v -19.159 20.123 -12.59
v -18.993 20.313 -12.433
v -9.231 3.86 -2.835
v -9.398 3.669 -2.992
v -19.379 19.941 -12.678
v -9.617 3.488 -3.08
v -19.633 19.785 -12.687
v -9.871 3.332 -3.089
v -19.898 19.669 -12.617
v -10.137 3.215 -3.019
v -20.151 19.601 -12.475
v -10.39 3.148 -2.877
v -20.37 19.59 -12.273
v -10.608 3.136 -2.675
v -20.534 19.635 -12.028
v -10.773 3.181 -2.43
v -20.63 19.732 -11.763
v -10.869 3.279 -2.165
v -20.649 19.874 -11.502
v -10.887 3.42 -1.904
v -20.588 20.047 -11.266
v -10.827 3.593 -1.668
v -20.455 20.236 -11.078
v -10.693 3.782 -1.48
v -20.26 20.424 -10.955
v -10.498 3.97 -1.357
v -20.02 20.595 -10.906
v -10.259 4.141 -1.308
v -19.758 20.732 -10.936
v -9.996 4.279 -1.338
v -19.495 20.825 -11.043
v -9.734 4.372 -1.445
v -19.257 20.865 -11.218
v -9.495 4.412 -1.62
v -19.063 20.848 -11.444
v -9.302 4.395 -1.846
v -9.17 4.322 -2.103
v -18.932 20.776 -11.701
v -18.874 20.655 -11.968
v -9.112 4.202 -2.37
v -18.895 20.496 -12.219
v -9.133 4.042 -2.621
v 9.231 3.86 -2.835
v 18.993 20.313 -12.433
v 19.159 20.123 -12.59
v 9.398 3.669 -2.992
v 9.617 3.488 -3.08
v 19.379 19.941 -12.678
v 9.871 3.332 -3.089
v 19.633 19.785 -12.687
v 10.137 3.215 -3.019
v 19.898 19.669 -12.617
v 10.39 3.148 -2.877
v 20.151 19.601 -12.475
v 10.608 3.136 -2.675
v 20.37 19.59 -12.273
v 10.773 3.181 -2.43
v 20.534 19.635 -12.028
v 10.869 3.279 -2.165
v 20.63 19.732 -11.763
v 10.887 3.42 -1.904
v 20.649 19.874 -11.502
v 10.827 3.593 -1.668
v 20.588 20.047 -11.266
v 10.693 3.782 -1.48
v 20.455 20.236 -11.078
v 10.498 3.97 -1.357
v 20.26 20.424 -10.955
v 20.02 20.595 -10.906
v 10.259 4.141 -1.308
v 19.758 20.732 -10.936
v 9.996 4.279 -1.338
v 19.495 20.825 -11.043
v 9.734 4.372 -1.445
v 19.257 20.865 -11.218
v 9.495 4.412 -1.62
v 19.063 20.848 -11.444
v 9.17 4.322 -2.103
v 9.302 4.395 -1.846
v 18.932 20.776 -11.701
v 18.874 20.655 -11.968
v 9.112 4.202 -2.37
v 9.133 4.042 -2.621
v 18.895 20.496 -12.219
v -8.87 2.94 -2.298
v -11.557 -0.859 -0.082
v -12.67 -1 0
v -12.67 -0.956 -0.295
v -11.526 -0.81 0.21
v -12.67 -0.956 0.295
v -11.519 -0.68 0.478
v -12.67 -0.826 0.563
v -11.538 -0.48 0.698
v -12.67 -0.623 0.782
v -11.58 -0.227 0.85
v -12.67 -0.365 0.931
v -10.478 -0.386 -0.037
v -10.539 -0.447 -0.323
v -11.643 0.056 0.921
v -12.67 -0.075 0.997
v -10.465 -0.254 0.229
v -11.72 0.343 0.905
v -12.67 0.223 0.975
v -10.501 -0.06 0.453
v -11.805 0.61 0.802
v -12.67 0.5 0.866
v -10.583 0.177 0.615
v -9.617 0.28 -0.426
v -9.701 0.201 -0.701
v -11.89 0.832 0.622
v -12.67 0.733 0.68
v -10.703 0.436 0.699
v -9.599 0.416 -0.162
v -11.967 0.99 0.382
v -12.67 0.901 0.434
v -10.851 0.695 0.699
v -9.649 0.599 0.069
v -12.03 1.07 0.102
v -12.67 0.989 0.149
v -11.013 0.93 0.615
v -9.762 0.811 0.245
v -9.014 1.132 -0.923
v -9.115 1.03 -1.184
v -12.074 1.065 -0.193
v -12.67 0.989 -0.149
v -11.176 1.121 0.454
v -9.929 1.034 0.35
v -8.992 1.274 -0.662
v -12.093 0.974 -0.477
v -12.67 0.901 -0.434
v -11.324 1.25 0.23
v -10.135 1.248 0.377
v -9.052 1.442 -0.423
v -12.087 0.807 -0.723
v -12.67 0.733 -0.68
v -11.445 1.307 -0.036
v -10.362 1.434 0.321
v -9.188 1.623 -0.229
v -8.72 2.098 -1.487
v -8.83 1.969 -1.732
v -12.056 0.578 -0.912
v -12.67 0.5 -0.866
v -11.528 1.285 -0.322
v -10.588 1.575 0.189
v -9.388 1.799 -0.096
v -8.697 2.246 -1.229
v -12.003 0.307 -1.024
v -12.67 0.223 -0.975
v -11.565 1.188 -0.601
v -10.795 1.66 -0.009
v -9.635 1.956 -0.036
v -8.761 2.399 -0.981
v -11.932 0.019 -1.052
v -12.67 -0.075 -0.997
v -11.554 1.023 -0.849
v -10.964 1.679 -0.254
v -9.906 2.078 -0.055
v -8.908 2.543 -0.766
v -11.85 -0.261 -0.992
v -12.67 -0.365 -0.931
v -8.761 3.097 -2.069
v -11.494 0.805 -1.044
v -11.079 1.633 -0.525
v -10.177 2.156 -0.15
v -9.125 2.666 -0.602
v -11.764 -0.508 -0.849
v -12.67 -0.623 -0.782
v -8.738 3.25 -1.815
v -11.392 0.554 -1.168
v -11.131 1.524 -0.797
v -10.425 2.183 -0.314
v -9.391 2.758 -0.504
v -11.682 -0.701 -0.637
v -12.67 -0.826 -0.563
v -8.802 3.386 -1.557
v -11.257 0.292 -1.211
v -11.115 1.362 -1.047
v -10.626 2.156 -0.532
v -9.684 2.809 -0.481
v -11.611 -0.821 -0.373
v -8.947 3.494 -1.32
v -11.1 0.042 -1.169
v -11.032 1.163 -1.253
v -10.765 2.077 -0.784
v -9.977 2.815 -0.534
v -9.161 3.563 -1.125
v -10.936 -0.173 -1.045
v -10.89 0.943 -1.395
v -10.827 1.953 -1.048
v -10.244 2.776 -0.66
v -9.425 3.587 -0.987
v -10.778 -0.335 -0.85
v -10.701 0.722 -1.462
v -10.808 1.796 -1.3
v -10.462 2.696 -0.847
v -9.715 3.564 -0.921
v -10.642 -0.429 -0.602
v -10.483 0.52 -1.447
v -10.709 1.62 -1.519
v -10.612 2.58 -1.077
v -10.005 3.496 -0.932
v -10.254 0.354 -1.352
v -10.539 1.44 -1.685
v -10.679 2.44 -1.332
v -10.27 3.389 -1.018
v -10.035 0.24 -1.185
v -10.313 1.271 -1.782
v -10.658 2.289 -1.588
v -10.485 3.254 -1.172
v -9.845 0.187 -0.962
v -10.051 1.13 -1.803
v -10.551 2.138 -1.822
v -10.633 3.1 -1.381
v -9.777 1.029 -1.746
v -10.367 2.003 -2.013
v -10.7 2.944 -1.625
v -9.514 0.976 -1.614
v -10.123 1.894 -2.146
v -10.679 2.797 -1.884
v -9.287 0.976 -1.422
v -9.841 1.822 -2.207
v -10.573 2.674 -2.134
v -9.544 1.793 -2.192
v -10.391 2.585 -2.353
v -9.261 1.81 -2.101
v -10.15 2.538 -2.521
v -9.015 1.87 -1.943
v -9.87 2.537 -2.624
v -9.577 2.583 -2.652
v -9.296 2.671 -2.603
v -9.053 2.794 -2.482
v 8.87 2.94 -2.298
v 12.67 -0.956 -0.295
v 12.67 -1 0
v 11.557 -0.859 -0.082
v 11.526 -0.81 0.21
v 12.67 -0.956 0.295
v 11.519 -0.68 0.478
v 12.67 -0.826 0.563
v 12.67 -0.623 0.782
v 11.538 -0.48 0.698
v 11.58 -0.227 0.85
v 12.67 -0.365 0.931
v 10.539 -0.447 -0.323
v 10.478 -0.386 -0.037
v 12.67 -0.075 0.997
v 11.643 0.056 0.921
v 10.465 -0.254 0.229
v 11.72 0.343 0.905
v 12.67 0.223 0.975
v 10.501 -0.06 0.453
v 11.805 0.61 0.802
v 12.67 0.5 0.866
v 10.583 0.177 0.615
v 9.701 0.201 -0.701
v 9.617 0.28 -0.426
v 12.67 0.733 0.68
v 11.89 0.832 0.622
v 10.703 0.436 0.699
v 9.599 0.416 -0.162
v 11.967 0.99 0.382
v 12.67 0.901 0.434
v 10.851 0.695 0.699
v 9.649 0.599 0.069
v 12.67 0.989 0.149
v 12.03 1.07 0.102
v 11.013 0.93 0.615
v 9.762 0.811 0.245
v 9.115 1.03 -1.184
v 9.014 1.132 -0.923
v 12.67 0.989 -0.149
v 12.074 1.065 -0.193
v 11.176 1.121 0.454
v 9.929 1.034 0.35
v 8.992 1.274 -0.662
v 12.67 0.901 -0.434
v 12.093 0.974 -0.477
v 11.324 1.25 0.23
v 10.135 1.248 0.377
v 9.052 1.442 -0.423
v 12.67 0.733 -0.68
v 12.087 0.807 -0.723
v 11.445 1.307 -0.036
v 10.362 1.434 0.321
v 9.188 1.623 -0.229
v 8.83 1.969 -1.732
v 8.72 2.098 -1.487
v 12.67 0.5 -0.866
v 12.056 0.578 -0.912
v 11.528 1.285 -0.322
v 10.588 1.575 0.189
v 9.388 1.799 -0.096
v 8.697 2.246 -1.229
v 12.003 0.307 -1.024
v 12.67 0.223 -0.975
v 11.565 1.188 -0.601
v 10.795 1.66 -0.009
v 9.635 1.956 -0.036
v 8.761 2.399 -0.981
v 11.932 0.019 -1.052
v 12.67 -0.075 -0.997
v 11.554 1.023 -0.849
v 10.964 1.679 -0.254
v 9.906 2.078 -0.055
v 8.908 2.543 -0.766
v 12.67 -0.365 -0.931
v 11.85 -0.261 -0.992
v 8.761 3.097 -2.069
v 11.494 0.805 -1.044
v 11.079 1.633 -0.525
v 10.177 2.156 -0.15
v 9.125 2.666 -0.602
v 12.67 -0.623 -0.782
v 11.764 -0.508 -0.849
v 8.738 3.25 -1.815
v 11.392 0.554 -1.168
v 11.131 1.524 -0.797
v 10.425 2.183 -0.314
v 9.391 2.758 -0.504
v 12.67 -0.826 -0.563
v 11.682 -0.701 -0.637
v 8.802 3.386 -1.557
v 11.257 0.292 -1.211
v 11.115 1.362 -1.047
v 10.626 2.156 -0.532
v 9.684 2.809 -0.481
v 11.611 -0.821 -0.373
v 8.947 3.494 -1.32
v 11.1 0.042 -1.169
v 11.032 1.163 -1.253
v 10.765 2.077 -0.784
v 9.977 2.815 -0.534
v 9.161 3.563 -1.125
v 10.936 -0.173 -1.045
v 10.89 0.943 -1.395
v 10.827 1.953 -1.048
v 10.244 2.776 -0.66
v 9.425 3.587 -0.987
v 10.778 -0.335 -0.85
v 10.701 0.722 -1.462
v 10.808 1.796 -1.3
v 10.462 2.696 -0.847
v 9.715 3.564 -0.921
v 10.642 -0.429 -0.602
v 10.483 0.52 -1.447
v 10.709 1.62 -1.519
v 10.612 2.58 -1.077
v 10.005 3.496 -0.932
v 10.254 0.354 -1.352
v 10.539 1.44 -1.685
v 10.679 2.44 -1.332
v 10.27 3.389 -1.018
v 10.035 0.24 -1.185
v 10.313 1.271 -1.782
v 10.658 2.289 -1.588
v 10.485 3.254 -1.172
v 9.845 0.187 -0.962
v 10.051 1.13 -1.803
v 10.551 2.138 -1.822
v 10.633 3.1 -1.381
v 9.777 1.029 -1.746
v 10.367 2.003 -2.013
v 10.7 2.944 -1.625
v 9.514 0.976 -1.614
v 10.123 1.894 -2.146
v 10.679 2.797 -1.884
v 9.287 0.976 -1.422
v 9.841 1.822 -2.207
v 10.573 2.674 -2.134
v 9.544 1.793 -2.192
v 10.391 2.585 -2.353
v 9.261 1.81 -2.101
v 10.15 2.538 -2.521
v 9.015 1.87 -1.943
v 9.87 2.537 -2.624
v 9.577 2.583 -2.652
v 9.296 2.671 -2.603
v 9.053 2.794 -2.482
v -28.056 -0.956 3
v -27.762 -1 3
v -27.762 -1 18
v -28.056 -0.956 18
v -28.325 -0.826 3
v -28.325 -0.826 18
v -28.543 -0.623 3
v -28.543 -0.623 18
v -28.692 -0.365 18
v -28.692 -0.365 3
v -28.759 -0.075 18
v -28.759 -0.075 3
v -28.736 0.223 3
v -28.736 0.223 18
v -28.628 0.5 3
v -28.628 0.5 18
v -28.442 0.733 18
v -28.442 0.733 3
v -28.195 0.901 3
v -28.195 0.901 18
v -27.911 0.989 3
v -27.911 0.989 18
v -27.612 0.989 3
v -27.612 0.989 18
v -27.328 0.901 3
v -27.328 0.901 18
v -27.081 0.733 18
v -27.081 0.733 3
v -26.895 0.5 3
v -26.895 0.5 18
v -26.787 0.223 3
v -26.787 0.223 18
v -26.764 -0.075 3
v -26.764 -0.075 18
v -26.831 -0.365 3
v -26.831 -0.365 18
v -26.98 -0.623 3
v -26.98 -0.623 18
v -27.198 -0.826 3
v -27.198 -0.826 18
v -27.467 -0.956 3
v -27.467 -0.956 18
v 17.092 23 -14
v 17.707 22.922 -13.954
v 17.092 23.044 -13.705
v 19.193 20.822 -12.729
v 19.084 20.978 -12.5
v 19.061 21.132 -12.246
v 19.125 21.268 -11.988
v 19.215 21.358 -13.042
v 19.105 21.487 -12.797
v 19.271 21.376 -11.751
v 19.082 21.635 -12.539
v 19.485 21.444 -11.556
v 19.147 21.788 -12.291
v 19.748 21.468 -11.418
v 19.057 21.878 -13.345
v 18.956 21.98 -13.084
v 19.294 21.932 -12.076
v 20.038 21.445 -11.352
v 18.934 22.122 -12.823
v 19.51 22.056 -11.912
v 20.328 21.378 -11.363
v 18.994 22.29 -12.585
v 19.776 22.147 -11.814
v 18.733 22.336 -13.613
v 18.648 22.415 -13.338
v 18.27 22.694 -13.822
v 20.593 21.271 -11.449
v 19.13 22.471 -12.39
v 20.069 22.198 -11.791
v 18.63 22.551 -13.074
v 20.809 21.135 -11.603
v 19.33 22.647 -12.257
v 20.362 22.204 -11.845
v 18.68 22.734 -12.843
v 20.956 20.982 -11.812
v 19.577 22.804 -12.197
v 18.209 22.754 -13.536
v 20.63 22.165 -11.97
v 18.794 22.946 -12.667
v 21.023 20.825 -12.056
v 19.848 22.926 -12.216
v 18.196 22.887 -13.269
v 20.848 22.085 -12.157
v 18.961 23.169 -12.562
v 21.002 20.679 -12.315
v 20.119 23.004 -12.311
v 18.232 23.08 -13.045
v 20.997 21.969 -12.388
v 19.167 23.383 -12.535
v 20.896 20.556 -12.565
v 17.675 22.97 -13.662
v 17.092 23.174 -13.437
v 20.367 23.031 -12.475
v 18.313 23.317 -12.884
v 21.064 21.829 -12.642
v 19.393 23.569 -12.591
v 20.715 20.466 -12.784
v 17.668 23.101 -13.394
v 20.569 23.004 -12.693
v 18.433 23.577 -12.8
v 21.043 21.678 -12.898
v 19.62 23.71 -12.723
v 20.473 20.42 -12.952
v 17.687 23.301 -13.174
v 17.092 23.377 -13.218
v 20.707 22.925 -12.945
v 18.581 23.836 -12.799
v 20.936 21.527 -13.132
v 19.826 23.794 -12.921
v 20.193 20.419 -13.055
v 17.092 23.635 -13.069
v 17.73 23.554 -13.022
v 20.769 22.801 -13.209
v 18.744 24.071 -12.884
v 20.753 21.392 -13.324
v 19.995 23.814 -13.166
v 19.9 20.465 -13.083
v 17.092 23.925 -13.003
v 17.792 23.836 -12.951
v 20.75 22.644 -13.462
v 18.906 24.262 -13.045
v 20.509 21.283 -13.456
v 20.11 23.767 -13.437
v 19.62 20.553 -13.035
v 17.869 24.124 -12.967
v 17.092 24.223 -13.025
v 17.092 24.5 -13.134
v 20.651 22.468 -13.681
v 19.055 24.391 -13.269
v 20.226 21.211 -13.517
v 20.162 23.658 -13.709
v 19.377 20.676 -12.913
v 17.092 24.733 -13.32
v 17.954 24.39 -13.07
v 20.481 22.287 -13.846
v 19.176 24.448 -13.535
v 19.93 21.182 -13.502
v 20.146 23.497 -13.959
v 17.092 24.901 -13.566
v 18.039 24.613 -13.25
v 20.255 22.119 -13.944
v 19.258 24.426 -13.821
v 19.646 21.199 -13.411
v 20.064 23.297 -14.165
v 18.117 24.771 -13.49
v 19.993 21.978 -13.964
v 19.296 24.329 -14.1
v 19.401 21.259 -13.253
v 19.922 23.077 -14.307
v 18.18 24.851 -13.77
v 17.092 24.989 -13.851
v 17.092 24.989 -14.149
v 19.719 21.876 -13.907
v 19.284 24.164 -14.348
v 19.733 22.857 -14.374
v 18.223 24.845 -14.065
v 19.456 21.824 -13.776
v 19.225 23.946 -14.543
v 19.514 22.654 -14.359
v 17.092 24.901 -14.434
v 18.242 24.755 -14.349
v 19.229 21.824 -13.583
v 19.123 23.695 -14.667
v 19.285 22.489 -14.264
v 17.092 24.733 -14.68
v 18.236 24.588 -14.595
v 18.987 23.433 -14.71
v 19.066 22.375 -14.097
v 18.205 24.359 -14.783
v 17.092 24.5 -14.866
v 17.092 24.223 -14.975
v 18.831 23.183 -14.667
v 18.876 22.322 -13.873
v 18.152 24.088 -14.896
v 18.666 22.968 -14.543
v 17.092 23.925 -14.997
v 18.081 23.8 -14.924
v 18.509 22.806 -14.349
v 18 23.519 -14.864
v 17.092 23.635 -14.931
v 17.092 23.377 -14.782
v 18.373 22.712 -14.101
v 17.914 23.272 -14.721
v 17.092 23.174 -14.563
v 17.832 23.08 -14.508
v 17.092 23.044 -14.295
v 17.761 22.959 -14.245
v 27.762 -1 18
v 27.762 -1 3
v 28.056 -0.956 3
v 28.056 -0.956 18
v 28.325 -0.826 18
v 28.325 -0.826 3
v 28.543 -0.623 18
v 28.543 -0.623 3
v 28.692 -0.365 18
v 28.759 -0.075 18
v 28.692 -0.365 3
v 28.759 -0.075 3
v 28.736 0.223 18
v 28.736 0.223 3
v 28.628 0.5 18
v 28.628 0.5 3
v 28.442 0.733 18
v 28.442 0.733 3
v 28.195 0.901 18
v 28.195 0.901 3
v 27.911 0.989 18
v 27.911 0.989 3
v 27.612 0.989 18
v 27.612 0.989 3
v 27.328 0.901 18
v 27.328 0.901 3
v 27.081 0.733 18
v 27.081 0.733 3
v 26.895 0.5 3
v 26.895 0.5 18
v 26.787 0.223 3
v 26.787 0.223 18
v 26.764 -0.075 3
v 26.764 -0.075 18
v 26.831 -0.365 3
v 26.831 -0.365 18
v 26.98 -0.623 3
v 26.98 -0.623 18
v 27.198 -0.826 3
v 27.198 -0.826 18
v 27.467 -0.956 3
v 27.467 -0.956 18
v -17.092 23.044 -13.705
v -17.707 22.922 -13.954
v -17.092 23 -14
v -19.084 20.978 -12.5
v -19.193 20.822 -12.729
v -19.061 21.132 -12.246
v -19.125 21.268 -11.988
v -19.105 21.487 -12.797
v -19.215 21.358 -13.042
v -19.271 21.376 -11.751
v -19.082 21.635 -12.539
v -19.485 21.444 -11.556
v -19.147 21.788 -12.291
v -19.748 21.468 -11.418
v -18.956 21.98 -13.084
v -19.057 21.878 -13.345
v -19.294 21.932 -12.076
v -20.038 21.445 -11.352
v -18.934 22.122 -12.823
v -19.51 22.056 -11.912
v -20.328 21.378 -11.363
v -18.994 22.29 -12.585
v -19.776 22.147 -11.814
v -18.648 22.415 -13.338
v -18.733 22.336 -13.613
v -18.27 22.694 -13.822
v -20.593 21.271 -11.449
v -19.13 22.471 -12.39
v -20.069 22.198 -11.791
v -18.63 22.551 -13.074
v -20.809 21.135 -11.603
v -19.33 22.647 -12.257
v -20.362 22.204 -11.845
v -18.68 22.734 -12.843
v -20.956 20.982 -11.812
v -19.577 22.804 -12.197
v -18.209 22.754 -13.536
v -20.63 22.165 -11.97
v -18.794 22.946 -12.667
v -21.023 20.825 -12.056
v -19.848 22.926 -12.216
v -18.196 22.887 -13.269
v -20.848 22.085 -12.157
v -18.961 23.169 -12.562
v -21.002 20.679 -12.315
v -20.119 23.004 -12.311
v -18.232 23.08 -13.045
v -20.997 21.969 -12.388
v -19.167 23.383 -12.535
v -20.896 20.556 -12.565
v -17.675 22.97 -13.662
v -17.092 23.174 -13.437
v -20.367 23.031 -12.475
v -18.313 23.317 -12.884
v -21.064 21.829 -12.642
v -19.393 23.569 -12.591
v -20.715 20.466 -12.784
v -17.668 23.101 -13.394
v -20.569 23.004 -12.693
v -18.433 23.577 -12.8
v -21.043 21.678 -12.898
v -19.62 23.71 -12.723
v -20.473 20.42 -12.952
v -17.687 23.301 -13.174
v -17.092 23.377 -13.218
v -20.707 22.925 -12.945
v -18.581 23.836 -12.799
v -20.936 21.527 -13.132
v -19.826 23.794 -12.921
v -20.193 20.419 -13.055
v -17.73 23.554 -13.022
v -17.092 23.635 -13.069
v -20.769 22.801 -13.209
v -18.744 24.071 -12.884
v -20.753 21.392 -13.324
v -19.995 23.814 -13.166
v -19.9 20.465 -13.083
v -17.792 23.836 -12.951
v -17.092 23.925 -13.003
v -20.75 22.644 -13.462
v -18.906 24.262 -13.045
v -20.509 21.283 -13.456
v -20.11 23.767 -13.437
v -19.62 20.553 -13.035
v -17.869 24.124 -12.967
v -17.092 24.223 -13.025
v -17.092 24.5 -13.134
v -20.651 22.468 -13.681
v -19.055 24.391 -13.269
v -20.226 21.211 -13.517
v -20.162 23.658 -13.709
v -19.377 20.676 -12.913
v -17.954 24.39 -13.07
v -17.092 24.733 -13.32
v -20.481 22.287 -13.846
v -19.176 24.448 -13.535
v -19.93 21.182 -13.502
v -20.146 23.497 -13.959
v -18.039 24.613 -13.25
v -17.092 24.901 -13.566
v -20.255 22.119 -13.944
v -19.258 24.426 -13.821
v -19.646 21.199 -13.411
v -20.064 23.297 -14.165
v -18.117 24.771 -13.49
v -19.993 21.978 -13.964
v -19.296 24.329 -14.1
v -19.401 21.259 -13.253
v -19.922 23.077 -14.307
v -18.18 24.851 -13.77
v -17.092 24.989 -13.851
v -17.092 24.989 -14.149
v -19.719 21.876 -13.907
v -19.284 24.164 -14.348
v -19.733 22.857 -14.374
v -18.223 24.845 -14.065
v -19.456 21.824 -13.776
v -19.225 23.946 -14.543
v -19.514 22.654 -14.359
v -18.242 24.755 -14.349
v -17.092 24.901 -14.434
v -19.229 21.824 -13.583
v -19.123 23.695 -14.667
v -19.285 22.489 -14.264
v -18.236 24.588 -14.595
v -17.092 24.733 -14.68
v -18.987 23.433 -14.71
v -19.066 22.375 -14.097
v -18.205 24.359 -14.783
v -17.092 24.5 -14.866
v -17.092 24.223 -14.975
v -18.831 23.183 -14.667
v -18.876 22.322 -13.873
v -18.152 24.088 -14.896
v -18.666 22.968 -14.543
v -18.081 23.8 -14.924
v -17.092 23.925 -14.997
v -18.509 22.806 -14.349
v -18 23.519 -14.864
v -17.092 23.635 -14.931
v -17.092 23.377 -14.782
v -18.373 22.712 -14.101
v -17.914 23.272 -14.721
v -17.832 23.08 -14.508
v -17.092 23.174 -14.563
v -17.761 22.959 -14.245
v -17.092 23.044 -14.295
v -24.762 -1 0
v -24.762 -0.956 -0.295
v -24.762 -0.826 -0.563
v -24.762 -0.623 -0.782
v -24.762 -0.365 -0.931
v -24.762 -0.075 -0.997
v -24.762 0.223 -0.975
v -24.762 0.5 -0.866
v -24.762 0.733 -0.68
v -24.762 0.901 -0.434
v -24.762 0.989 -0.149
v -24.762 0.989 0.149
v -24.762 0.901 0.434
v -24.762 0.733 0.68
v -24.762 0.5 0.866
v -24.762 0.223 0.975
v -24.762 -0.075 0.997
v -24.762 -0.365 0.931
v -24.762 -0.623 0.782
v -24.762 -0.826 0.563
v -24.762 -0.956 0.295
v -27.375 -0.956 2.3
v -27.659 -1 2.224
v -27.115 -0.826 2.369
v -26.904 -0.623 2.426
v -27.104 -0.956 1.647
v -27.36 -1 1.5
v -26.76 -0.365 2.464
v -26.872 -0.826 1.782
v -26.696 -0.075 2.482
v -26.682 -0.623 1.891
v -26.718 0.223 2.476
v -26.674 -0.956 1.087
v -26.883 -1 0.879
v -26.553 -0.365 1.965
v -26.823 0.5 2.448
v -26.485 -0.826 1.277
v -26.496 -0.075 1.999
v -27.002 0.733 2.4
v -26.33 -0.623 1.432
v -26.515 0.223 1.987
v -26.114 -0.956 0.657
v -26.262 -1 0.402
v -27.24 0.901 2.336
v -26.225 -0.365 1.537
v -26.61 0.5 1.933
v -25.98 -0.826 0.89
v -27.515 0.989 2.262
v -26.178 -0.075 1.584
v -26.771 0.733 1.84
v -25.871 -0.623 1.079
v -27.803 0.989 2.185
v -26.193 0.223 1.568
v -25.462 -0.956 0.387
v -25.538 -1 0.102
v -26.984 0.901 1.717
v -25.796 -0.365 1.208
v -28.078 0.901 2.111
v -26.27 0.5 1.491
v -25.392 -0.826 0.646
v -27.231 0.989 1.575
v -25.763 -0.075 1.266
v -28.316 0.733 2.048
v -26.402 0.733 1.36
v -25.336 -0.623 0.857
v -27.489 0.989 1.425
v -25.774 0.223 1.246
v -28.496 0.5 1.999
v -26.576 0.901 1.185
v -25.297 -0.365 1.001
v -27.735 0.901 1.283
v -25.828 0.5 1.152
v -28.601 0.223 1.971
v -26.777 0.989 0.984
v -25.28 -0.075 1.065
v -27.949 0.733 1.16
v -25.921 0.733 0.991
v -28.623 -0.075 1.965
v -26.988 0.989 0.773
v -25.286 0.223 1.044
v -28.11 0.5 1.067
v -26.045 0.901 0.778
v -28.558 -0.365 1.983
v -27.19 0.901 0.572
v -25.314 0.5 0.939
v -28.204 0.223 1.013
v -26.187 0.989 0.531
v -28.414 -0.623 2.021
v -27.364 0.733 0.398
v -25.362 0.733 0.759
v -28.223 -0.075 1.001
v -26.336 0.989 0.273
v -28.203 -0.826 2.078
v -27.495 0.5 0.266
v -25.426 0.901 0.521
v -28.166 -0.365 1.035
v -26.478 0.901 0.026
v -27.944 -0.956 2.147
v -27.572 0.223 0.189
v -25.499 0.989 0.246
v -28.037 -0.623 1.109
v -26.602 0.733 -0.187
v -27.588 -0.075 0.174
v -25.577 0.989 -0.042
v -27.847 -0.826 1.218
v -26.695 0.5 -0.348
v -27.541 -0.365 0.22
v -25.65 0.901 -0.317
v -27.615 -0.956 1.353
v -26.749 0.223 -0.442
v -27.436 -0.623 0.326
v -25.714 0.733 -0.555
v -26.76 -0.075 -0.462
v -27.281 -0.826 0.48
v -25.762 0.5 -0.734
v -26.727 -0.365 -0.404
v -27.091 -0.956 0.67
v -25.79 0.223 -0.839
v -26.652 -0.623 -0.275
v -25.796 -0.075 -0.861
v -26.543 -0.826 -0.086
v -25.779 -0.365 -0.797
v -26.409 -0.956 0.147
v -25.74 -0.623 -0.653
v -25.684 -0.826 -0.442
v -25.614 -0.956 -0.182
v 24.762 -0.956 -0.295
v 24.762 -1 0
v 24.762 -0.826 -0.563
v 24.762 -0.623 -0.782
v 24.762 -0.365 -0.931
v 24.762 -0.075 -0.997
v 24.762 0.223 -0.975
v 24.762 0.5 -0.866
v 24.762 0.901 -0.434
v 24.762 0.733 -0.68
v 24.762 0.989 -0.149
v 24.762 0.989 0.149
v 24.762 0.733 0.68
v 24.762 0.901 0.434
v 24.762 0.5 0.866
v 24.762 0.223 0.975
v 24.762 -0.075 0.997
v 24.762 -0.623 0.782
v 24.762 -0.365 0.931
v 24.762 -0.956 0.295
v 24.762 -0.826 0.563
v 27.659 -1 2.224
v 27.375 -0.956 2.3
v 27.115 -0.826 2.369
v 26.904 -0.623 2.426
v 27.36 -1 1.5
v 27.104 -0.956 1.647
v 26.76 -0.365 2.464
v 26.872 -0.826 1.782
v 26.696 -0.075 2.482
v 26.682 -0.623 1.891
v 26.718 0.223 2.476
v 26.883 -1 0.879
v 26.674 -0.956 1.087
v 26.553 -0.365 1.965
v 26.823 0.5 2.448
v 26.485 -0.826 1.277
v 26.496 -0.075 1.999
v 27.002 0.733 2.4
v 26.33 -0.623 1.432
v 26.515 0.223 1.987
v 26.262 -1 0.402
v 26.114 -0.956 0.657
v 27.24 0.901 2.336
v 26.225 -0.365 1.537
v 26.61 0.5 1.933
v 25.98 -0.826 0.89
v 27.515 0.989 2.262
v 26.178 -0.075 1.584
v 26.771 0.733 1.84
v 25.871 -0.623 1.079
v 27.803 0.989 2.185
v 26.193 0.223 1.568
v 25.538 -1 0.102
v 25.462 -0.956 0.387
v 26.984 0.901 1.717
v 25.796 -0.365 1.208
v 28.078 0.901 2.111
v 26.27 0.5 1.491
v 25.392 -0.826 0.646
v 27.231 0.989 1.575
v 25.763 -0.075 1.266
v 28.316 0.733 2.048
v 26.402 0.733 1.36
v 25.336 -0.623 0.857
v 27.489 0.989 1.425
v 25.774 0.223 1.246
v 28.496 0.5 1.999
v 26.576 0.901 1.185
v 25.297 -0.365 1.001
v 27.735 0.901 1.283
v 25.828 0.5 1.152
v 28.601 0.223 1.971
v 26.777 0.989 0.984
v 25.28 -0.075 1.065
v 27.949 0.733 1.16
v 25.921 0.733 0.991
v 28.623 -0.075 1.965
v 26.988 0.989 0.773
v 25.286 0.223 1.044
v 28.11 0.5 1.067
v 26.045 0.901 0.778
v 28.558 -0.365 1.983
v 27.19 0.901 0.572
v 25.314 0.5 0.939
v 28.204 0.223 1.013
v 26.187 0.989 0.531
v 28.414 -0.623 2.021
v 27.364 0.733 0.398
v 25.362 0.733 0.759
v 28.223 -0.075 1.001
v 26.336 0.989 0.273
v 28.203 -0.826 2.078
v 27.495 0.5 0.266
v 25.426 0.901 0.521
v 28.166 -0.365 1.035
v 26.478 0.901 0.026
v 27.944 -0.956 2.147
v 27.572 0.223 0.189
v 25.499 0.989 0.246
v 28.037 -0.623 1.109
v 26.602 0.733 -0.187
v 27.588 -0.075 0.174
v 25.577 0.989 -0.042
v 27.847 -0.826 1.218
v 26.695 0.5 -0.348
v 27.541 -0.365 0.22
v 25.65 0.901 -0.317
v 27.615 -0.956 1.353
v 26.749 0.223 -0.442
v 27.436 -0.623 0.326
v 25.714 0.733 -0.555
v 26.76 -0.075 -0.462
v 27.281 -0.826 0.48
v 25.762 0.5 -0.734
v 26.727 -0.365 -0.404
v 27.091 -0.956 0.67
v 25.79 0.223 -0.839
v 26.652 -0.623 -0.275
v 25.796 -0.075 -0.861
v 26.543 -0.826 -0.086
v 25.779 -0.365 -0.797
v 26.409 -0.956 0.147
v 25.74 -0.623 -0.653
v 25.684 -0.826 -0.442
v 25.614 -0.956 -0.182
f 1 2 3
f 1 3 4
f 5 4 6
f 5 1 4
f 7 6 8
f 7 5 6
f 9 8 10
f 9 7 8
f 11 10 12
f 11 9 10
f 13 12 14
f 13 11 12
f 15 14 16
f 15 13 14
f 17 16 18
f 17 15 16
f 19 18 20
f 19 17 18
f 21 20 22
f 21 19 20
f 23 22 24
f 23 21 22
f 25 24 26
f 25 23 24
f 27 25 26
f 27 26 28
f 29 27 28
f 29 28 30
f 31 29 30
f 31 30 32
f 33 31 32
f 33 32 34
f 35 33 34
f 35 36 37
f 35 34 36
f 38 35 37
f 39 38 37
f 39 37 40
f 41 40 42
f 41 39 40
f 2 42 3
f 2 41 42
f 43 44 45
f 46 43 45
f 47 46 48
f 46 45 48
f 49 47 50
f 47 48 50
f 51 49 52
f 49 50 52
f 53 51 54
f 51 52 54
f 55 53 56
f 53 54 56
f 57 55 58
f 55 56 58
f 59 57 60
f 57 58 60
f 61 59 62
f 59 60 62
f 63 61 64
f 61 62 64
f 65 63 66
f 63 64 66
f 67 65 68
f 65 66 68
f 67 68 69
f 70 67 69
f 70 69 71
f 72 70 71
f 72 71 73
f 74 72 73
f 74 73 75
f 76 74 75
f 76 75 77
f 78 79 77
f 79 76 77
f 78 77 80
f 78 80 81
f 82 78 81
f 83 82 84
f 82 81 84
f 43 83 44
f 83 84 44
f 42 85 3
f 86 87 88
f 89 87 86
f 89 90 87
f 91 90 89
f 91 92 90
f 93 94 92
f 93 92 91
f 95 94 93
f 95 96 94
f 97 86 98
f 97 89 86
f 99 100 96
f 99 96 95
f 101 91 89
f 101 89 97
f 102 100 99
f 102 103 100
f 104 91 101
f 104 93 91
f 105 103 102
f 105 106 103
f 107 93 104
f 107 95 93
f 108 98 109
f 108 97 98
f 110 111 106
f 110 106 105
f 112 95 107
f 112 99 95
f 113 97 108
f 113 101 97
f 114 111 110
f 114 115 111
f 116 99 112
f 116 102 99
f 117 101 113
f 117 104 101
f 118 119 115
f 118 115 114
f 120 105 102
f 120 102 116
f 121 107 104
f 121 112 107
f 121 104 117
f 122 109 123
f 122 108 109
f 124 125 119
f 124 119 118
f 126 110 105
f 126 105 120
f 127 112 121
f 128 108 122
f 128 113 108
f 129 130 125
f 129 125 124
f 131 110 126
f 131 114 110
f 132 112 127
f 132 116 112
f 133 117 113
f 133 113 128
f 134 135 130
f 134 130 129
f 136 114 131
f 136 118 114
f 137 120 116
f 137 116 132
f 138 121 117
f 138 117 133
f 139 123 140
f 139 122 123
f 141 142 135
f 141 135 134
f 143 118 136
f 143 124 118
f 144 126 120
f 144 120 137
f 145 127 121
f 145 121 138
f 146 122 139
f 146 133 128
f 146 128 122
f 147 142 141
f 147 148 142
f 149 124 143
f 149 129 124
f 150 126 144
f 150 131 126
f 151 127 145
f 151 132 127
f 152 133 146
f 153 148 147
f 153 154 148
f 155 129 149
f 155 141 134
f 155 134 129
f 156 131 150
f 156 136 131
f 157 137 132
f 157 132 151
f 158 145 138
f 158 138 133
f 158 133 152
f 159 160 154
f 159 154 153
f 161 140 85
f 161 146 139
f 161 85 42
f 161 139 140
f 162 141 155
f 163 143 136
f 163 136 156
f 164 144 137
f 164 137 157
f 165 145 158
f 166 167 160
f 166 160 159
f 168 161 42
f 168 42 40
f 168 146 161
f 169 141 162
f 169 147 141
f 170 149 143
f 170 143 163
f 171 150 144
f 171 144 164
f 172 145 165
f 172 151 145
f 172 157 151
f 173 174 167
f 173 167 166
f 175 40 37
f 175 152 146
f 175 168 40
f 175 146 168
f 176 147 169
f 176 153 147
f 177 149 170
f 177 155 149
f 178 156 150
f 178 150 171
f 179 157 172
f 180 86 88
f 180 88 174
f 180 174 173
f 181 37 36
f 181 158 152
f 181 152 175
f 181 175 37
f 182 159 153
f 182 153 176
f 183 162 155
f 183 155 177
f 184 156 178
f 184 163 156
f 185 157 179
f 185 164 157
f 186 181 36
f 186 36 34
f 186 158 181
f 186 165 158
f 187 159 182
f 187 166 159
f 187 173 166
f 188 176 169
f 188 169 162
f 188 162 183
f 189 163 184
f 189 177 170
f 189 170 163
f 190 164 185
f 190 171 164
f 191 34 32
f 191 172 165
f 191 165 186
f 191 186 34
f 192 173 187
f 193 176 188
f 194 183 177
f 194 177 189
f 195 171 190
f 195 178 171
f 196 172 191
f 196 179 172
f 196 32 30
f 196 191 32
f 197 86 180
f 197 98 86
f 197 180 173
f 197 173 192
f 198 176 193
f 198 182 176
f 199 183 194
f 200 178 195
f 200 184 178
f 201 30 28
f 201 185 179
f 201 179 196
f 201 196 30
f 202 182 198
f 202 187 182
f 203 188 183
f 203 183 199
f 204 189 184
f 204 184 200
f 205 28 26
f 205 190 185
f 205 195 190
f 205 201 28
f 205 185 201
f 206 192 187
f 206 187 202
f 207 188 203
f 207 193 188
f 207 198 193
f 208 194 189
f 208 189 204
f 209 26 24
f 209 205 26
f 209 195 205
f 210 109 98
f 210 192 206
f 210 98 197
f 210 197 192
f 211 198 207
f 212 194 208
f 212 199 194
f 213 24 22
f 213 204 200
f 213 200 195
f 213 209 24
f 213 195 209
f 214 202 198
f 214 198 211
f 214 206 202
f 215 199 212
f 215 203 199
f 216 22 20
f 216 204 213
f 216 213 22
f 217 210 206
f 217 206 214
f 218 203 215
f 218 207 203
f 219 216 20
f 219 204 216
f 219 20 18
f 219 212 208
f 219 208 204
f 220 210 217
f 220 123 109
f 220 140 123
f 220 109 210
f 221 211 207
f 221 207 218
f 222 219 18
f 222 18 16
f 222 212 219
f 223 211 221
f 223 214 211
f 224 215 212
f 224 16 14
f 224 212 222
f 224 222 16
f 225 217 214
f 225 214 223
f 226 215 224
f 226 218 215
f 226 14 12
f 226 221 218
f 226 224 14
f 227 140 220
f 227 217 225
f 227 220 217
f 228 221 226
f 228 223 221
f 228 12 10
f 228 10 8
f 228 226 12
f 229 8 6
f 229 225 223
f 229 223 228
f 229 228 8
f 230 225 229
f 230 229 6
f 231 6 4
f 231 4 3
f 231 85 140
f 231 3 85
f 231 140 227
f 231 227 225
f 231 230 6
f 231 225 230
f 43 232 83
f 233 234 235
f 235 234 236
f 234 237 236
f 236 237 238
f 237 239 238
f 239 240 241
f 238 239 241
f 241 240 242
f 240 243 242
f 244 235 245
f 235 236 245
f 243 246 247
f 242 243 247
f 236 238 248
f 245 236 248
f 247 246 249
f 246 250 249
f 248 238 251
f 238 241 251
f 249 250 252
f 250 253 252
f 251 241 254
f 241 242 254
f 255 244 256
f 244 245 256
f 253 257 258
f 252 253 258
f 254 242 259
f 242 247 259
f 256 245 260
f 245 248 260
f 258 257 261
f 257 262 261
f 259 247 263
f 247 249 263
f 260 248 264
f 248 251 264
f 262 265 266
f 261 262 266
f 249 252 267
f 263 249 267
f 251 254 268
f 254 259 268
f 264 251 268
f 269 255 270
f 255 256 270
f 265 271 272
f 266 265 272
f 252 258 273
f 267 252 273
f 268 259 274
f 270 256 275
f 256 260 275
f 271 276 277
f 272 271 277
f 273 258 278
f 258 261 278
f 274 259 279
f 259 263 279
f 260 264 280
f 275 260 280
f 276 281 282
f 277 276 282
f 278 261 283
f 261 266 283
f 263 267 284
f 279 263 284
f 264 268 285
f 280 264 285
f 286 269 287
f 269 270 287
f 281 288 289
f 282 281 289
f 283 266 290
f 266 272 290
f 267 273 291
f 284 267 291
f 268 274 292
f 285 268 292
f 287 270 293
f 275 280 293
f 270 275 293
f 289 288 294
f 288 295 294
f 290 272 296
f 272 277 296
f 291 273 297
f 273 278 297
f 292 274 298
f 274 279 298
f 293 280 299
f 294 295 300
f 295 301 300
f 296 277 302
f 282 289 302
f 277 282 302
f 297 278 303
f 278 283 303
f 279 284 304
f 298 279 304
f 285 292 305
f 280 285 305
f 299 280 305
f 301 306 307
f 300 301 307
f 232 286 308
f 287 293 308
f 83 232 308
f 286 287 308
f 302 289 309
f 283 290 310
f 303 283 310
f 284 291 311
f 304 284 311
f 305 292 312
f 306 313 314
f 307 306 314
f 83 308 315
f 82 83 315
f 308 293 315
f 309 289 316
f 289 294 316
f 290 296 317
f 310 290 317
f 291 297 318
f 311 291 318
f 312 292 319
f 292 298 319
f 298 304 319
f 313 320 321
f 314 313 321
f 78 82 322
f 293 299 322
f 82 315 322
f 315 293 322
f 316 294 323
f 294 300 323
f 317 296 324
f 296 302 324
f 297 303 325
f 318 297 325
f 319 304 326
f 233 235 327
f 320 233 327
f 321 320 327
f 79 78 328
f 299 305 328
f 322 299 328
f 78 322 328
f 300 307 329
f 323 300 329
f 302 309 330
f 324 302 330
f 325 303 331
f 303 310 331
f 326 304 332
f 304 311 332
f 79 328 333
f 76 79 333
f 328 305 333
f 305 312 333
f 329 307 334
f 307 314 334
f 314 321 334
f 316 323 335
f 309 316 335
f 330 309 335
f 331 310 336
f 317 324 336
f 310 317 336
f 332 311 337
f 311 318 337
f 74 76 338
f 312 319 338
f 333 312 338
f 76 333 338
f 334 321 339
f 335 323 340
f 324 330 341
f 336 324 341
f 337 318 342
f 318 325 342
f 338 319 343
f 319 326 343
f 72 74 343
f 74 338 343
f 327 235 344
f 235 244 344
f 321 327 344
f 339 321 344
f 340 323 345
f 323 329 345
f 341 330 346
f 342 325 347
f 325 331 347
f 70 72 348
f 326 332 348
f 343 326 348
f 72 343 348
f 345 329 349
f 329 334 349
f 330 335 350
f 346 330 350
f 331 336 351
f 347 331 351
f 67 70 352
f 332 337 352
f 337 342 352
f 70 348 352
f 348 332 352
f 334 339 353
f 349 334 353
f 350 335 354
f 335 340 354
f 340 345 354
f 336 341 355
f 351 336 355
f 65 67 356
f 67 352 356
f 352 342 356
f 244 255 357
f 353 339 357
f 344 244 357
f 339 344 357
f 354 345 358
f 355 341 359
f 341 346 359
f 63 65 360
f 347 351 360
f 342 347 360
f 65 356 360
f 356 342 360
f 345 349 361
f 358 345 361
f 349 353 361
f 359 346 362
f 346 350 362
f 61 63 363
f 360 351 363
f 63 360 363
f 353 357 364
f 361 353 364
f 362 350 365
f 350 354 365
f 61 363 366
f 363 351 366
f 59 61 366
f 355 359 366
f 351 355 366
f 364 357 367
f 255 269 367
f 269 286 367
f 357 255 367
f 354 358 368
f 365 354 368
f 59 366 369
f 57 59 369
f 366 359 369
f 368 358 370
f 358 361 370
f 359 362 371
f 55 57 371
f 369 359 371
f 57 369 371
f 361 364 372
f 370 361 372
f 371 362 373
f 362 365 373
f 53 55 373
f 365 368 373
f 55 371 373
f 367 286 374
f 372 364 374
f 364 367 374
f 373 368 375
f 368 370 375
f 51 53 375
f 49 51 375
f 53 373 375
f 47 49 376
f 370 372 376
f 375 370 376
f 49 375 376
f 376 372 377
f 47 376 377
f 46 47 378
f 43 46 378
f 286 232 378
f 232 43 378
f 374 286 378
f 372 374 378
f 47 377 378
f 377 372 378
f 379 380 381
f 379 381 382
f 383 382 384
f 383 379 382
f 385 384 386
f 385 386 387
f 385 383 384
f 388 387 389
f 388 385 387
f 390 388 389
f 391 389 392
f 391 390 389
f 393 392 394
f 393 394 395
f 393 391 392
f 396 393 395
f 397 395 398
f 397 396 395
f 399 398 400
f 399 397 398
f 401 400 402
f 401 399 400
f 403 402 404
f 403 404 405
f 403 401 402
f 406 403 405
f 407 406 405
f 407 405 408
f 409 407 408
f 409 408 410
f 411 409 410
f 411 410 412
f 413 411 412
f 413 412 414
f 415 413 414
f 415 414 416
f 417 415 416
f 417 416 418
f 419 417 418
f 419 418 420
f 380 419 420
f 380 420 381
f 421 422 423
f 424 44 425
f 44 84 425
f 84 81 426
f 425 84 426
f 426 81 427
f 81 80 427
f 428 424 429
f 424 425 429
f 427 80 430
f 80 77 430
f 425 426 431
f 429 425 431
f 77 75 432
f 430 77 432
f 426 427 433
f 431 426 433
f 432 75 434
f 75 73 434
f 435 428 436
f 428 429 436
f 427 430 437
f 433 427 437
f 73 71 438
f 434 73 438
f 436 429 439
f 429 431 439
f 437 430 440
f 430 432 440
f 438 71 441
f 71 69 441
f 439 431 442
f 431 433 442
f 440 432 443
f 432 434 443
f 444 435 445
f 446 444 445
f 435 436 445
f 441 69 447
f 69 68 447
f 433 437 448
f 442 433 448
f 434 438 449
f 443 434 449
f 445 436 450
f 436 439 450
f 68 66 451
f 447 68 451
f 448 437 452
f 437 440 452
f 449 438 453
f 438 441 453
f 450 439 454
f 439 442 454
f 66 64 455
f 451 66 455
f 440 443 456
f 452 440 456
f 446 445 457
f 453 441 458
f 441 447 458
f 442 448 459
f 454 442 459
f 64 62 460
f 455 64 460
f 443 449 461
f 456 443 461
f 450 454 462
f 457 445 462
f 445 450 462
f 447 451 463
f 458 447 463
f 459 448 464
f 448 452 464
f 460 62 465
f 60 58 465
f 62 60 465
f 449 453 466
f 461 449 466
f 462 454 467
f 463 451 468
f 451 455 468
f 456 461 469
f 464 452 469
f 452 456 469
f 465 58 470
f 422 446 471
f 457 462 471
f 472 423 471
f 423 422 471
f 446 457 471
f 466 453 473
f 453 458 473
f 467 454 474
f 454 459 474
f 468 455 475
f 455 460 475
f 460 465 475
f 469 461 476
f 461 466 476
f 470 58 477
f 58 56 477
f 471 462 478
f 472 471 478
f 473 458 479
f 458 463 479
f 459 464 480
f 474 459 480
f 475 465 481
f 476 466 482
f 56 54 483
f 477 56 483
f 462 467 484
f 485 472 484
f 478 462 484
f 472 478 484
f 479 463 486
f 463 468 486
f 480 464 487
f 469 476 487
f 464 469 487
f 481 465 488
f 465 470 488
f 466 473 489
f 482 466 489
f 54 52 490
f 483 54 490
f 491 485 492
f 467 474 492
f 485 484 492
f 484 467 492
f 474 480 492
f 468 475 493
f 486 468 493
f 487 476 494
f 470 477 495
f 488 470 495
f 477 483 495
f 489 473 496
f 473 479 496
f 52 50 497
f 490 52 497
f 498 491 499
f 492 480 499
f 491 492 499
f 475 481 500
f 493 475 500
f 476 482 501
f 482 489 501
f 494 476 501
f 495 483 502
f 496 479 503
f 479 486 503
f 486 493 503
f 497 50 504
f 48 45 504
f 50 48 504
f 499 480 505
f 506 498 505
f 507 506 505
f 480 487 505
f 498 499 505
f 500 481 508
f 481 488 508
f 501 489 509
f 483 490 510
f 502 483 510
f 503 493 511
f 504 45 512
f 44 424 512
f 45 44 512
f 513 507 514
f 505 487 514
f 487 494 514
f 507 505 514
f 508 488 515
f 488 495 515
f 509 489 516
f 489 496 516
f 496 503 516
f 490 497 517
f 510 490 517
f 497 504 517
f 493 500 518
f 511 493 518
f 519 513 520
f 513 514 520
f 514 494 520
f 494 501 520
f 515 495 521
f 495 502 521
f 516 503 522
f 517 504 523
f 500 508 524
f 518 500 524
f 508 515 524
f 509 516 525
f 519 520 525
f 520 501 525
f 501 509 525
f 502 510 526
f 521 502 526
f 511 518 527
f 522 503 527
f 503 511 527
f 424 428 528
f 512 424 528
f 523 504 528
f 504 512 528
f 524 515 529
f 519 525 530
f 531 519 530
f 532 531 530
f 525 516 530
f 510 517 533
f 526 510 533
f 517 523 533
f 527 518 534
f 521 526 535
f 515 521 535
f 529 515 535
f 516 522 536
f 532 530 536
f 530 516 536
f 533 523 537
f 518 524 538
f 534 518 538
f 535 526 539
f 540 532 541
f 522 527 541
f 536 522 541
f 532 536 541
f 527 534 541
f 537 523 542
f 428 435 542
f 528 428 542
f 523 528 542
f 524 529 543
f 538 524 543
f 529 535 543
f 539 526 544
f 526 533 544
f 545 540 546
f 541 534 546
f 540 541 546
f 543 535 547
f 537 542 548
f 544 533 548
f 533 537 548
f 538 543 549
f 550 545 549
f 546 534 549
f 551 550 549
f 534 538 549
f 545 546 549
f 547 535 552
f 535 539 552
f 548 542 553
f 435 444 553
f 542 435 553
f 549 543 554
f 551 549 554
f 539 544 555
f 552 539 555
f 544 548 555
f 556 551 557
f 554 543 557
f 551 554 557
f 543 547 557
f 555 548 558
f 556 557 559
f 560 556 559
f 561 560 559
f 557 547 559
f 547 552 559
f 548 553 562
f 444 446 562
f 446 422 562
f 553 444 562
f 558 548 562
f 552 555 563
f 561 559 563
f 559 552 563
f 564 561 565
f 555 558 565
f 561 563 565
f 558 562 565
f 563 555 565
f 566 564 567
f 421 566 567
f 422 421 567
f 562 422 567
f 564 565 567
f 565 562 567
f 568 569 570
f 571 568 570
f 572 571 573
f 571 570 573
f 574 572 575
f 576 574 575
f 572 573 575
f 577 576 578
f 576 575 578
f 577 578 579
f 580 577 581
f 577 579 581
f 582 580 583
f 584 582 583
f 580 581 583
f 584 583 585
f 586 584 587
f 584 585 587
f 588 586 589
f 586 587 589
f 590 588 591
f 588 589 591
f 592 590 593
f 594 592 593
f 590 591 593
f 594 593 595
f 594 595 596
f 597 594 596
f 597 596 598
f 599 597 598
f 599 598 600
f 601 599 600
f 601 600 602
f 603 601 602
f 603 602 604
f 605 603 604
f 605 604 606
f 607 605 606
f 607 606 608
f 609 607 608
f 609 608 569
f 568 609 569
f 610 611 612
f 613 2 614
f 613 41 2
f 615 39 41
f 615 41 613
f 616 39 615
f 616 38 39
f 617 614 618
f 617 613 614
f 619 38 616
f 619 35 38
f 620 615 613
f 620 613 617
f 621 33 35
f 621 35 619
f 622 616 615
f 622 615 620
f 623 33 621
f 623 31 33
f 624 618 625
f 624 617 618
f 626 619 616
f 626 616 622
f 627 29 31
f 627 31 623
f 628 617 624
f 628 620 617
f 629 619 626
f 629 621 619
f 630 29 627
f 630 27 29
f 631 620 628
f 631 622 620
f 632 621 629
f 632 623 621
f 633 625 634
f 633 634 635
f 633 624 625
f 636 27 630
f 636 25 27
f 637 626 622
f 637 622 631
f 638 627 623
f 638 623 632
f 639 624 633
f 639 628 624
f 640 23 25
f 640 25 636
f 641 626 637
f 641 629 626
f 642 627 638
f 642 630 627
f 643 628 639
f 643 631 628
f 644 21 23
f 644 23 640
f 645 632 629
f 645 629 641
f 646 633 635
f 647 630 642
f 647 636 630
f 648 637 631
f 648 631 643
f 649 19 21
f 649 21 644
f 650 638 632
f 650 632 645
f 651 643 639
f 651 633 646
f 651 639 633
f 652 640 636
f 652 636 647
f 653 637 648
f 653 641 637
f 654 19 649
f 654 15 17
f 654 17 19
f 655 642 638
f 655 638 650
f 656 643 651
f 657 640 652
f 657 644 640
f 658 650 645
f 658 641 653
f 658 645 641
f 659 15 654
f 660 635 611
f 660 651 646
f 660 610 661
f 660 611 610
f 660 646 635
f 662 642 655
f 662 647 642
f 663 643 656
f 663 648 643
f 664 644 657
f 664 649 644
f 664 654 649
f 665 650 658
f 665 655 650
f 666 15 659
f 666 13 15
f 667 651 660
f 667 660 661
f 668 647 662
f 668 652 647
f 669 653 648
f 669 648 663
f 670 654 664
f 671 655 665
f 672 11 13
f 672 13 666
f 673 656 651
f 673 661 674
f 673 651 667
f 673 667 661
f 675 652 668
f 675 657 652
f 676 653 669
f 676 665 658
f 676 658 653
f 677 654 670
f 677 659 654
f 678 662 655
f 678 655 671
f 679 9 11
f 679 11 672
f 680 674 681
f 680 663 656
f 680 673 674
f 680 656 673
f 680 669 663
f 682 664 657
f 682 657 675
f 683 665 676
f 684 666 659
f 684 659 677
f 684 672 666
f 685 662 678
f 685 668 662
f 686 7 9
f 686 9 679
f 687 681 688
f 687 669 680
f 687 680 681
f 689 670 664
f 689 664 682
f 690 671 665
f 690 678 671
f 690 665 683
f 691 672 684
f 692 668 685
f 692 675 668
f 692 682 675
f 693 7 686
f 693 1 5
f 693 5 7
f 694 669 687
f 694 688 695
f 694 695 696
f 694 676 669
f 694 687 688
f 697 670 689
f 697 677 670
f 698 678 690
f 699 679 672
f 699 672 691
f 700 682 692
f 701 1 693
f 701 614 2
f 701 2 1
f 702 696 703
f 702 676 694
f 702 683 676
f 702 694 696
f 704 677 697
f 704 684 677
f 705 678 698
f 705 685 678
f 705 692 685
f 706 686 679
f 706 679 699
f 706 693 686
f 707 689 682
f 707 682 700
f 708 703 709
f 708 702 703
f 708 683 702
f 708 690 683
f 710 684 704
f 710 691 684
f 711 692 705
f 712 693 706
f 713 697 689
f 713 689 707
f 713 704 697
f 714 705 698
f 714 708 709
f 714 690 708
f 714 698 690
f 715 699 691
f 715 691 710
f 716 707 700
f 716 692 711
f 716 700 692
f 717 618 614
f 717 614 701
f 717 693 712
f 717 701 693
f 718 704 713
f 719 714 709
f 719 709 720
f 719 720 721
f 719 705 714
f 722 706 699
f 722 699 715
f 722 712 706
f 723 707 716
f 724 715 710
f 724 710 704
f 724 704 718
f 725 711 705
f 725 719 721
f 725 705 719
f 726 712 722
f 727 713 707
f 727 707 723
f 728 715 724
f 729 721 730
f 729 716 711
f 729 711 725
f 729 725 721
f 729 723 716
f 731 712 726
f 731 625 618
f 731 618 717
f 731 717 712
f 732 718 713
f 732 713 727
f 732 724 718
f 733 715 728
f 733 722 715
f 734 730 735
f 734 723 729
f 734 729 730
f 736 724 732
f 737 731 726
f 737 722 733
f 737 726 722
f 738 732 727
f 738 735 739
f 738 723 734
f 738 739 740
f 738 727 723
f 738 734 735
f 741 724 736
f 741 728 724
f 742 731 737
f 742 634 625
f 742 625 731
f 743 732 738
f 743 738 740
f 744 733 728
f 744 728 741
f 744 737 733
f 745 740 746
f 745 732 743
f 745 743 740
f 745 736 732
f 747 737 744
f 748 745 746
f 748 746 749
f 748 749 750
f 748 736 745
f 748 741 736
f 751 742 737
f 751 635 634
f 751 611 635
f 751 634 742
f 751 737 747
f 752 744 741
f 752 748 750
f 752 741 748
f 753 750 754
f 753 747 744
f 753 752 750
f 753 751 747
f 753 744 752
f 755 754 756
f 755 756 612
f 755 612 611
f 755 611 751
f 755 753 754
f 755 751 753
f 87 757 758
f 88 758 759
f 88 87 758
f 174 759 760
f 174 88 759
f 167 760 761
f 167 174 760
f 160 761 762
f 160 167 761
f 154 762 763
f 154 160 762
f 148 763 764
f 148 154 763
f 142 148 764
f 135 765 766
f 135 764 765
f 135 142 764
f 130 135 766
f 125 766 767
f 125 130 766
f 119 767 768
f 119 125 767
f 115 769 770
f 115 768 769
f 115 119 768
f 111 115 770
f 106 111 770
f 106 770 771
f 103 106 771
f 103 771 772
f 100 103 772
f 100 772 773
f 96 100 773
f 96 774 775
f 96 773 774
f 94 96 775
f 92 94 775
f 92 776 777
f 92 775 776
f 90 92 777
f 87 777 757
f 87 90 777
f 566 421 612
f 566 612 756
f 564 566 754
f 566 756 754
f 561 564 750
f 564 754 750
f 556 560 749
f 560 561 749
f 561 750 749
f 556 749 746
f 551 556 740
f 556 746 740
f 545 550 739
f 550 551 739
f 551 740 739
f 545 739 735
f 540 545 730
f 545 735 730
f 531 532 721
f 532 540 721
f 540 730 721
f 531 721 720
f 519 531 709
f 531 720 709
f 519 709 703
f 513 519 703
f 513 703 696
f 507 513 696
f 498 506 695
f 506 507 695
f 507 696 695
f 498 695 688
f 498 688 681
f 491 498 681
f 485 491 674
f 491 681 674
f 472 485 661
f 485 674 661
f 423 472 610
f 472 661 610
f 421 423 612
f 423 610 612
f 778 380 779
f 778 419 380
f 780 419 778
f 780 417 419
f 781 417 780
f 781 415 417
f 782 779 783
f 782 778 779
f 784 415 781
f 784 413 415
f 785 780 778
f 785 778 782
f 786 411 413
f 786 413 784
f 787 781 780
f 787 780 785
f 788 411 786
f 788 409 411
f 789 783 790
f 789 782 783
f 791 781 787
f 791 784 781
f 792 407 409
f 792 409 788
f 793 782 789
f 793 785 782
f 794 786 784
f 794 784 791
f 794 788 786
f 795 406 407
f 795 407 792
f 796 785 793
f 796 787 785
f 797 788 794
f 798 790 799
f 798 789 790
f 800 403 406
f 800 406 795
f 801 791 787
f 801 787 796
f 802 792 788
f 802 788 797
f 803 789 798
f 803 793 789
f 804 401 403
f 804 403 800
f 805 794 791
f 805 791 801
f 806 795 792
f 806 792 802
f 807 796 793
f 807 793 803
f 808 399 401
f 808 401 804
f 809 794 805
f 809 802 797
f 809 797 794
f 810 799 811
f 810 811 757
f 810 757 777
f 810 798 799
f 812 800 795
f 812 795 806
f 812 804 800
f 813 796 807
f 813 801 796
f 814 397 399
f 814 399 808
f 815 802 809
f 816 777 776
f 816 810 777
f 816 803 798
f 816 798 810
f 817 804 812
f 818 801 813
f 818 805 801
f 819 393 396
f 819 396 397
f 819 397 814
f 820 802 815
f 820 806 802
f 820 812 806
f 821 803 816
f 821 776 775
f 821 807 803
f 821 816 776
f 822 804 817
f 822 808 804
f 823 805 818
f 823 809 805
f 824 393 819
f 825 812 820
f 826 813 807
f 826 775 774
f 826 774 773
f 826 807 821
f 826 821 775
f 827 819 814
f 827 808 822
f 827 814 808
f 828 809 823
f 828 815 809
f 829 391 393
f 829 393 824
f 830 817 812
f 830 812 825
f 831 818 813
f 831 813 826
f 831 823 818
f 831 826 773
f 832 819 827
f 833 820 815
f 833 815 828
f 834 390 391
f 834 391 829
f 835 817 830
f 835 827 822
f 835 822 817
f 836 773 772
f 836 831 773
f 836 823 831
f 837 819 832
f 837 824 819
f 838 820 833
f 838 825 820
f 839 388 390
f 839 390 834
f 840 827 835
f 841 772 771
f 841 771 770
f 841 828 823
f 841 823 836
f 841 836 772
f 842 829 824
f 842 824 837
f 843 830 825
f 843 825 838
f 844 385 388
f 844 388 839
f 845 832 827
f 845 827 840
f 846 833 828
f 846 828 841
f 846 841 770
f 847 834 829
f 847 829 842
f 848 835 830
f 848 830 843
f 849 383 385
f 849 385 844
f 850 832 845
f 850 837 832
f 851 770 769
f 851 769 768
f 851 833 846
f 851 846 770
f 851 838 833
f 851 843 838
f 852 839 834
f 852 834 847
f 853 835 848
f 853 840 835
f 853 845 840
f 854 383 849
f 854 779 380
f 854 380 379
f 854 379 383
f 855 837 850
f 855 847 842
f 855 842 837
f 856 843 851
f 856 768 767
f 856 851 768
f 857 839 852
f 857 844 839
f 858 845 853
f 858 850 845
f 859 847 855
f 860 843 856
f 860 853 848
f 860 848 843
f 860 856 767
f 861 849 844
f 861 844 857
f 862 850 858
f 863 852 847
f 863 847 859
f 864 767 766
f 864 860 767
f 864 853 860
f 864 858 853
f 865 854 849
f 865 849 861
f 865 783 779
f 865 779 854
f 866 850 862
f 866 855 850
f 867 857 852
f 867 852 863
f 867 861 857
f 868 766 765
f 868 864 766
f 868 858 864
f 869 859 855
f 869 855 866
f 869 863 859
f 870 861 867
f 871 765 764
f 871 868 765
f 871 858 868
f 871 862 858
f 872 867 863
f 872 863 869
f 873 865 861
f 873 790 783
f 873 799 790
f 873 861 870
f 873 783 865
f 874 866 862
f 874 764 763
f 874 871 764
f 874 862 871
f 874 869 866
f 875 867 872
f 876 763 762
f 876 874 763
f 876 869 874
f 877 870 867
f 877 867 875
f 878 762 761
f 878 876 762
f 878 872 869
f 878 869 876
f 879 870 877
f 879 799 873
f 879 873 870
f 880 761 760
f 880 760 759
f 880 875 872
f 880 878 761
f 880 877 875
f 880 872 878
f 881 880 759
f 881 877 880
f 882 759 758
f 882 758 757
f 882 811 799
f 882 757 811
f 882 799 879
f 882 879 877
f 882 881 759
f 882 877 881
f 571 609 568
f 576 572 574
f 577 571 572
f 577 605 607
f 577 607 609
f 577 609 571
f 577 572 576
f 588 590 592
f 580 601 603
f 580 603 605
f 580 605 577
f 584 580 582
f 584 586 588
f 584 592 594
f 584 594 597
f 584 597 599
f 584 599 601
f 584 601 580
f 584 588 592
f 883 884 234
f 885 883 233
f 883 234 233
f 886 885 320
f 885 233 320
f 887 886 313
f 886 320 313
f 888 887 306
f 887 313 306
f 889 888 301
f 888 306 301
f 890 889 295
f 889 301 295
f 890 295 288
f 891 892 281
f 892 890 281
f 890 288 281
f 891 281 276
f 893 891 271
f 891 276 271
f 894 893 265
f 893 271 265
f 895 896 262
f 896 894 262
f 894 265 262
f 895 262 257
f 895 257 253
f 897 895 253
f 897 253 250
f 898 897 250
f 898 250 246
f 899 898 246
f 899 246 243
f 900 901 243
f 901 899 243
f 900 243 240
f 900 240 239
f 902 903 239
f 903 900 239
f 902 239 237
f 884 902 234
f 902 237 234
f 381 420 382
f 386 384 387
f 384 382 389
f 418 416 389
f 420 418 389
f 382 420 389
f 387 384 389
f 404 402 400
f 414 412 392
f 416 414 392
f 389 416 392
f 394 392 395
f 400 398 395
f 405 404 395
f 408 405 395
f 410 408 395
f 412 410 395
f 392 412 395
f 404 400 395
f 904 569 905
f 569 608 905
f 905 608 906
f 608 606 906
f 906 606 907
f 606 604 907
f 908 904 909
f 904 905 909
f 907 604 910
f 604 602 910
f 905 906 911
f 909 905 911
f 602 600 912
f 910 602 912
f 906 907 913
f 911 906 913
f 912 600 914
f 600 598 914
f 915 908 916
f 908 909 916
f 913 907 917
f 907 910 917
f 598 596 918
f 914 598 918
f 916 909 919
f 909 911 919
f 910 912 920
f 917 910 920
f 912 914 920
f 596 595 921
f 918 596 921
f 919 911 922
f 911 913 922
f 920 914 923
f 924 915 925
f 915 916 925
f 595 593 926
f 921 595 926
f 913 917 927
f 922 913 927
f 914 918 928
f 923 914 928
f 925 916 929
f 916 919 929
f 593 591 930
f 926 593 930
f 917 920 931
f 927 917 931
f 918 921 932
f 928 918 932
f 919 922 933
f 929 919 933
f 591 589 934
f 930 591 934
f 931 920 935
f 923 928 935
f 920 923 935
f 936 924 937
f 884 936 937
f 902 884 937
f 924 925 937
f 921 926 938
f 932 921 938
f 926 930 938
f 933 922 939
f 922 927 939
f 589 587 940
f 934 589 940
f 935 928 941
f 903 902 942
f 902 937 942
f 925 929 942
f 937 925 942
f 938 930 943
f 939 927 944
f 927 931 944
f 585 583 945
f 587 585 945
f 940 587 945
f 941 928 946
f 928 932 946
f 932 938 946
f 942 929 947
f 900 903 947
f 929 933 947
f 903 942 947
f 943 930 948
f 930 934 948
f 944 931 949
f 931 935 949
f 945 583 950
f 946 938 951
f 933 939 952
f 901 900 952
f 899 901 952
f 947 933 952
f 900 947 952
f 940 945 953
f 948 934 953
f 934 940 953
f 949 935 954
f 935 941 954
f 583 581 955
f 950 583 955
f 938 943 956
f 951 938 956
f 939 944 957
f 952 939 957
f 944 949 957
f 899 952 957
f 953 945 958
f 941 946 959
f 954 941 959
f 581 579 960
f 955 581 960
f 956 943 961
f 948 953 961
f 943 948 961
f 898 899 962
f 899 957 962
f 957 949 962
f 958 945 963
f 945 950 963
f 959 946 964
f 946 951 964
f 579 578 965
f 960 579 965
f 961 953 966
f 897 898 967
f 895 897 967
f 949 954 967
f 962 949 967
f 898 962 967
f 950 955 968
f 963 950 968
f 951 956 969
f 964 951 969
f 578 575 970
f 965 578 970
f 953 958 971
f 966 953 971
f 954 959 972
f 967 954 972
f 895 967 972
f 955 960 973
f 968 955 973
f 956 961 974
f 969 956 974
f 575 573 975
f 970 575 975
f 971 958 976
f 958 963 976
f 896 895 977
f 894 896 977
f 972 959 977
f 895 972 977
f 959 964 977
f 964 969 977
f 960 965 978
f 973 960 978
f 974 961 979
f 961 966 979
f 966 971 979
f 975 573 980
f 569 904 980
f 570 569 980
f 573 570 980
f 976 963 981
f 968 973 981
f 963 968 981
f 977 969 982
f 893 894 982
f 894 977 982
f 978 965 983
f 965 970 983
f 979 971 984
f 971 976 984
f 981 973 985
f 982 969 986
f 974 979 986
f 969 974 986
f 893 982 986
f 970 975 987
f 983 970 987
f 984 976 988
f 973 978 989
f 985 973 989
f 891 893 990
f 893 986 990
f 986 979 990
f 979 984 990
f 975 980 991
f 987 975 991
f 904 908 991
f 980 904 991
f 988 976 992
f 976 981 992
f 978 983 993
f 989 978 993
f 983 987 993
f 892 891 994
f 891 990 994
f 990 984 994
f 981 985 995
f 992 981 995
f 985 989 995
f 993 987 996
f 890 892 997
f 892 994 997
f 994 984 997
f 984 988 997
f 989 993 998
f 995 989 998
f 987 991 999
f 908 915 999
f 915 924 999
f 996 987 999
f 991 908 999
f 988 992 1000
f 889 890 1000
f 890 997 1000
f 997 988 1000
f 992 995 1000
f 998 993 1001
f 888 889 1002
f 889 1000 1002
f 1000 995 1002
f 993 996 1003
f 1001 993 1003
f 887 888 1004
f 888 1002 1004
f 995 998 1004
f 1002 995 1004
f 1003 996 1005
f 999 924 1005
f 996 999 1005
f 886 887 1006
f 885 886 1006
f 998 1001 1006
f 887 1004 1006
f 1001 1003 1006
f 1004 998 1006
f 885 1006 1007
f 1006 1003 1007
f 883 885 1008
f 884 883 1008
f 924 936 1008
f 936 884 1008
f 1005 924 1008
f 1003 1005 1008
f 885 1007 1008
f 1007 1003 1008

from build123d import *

# Parameters (mm, degrees)
SWEEP2_PROFILE_R = 1


with BuildPart() as part:
    # Sweep2: sweep along a curve in space
    with BuildLine() as sweep2_path:
        Line((-27.761508308, 0, 18), (-27.761508308, 0, 3))
        ThreePointArc((-27.761508308, 0, 3), (-26.882828652, 0, 0.878679656), (-24.761508308, 0, 0))
        Line((-24.761508308, 0, 0), (-12.669849025, 0, 0))
        ThreePointArc((-12.669849025, 0, 0), (-10.11010991, 1.239933795, -0.723294713), (-10, 3.773138459, -2.200997434))
        Line((-10, 3.773138459, -2.200997434), (-19.761508308, 20.226861541, -11.799002566))
        ThreePointArc((-19.761508308, 20.226861541, -11.799002566), (-19.651398399, 22.760066205, -13.276705287), (-17.091659283, 24, -14))
        Line((-17.091659283, 24, -14), (0, 24, -14))
    # Sweep2 profile (on start of the path) → Sweep2 (sweep)
    with BuildSketch(Plane(origin=(-27.761508308, 0, 18), x_dir=(0, -1, 0), z_dir=(0, 0, -1))):
        Circle(SWEEP2_PROFILE_R)
    sweep2 = sweep(path=sweep2_path.line)

    # Mirror1: Sweep2 across plane
    add(sweep2.mirror(Plane(origin=(0, 0, 0), x_dir=(0, 0, 1), z_dir=(1, 0, 0))))


solid = part.part
